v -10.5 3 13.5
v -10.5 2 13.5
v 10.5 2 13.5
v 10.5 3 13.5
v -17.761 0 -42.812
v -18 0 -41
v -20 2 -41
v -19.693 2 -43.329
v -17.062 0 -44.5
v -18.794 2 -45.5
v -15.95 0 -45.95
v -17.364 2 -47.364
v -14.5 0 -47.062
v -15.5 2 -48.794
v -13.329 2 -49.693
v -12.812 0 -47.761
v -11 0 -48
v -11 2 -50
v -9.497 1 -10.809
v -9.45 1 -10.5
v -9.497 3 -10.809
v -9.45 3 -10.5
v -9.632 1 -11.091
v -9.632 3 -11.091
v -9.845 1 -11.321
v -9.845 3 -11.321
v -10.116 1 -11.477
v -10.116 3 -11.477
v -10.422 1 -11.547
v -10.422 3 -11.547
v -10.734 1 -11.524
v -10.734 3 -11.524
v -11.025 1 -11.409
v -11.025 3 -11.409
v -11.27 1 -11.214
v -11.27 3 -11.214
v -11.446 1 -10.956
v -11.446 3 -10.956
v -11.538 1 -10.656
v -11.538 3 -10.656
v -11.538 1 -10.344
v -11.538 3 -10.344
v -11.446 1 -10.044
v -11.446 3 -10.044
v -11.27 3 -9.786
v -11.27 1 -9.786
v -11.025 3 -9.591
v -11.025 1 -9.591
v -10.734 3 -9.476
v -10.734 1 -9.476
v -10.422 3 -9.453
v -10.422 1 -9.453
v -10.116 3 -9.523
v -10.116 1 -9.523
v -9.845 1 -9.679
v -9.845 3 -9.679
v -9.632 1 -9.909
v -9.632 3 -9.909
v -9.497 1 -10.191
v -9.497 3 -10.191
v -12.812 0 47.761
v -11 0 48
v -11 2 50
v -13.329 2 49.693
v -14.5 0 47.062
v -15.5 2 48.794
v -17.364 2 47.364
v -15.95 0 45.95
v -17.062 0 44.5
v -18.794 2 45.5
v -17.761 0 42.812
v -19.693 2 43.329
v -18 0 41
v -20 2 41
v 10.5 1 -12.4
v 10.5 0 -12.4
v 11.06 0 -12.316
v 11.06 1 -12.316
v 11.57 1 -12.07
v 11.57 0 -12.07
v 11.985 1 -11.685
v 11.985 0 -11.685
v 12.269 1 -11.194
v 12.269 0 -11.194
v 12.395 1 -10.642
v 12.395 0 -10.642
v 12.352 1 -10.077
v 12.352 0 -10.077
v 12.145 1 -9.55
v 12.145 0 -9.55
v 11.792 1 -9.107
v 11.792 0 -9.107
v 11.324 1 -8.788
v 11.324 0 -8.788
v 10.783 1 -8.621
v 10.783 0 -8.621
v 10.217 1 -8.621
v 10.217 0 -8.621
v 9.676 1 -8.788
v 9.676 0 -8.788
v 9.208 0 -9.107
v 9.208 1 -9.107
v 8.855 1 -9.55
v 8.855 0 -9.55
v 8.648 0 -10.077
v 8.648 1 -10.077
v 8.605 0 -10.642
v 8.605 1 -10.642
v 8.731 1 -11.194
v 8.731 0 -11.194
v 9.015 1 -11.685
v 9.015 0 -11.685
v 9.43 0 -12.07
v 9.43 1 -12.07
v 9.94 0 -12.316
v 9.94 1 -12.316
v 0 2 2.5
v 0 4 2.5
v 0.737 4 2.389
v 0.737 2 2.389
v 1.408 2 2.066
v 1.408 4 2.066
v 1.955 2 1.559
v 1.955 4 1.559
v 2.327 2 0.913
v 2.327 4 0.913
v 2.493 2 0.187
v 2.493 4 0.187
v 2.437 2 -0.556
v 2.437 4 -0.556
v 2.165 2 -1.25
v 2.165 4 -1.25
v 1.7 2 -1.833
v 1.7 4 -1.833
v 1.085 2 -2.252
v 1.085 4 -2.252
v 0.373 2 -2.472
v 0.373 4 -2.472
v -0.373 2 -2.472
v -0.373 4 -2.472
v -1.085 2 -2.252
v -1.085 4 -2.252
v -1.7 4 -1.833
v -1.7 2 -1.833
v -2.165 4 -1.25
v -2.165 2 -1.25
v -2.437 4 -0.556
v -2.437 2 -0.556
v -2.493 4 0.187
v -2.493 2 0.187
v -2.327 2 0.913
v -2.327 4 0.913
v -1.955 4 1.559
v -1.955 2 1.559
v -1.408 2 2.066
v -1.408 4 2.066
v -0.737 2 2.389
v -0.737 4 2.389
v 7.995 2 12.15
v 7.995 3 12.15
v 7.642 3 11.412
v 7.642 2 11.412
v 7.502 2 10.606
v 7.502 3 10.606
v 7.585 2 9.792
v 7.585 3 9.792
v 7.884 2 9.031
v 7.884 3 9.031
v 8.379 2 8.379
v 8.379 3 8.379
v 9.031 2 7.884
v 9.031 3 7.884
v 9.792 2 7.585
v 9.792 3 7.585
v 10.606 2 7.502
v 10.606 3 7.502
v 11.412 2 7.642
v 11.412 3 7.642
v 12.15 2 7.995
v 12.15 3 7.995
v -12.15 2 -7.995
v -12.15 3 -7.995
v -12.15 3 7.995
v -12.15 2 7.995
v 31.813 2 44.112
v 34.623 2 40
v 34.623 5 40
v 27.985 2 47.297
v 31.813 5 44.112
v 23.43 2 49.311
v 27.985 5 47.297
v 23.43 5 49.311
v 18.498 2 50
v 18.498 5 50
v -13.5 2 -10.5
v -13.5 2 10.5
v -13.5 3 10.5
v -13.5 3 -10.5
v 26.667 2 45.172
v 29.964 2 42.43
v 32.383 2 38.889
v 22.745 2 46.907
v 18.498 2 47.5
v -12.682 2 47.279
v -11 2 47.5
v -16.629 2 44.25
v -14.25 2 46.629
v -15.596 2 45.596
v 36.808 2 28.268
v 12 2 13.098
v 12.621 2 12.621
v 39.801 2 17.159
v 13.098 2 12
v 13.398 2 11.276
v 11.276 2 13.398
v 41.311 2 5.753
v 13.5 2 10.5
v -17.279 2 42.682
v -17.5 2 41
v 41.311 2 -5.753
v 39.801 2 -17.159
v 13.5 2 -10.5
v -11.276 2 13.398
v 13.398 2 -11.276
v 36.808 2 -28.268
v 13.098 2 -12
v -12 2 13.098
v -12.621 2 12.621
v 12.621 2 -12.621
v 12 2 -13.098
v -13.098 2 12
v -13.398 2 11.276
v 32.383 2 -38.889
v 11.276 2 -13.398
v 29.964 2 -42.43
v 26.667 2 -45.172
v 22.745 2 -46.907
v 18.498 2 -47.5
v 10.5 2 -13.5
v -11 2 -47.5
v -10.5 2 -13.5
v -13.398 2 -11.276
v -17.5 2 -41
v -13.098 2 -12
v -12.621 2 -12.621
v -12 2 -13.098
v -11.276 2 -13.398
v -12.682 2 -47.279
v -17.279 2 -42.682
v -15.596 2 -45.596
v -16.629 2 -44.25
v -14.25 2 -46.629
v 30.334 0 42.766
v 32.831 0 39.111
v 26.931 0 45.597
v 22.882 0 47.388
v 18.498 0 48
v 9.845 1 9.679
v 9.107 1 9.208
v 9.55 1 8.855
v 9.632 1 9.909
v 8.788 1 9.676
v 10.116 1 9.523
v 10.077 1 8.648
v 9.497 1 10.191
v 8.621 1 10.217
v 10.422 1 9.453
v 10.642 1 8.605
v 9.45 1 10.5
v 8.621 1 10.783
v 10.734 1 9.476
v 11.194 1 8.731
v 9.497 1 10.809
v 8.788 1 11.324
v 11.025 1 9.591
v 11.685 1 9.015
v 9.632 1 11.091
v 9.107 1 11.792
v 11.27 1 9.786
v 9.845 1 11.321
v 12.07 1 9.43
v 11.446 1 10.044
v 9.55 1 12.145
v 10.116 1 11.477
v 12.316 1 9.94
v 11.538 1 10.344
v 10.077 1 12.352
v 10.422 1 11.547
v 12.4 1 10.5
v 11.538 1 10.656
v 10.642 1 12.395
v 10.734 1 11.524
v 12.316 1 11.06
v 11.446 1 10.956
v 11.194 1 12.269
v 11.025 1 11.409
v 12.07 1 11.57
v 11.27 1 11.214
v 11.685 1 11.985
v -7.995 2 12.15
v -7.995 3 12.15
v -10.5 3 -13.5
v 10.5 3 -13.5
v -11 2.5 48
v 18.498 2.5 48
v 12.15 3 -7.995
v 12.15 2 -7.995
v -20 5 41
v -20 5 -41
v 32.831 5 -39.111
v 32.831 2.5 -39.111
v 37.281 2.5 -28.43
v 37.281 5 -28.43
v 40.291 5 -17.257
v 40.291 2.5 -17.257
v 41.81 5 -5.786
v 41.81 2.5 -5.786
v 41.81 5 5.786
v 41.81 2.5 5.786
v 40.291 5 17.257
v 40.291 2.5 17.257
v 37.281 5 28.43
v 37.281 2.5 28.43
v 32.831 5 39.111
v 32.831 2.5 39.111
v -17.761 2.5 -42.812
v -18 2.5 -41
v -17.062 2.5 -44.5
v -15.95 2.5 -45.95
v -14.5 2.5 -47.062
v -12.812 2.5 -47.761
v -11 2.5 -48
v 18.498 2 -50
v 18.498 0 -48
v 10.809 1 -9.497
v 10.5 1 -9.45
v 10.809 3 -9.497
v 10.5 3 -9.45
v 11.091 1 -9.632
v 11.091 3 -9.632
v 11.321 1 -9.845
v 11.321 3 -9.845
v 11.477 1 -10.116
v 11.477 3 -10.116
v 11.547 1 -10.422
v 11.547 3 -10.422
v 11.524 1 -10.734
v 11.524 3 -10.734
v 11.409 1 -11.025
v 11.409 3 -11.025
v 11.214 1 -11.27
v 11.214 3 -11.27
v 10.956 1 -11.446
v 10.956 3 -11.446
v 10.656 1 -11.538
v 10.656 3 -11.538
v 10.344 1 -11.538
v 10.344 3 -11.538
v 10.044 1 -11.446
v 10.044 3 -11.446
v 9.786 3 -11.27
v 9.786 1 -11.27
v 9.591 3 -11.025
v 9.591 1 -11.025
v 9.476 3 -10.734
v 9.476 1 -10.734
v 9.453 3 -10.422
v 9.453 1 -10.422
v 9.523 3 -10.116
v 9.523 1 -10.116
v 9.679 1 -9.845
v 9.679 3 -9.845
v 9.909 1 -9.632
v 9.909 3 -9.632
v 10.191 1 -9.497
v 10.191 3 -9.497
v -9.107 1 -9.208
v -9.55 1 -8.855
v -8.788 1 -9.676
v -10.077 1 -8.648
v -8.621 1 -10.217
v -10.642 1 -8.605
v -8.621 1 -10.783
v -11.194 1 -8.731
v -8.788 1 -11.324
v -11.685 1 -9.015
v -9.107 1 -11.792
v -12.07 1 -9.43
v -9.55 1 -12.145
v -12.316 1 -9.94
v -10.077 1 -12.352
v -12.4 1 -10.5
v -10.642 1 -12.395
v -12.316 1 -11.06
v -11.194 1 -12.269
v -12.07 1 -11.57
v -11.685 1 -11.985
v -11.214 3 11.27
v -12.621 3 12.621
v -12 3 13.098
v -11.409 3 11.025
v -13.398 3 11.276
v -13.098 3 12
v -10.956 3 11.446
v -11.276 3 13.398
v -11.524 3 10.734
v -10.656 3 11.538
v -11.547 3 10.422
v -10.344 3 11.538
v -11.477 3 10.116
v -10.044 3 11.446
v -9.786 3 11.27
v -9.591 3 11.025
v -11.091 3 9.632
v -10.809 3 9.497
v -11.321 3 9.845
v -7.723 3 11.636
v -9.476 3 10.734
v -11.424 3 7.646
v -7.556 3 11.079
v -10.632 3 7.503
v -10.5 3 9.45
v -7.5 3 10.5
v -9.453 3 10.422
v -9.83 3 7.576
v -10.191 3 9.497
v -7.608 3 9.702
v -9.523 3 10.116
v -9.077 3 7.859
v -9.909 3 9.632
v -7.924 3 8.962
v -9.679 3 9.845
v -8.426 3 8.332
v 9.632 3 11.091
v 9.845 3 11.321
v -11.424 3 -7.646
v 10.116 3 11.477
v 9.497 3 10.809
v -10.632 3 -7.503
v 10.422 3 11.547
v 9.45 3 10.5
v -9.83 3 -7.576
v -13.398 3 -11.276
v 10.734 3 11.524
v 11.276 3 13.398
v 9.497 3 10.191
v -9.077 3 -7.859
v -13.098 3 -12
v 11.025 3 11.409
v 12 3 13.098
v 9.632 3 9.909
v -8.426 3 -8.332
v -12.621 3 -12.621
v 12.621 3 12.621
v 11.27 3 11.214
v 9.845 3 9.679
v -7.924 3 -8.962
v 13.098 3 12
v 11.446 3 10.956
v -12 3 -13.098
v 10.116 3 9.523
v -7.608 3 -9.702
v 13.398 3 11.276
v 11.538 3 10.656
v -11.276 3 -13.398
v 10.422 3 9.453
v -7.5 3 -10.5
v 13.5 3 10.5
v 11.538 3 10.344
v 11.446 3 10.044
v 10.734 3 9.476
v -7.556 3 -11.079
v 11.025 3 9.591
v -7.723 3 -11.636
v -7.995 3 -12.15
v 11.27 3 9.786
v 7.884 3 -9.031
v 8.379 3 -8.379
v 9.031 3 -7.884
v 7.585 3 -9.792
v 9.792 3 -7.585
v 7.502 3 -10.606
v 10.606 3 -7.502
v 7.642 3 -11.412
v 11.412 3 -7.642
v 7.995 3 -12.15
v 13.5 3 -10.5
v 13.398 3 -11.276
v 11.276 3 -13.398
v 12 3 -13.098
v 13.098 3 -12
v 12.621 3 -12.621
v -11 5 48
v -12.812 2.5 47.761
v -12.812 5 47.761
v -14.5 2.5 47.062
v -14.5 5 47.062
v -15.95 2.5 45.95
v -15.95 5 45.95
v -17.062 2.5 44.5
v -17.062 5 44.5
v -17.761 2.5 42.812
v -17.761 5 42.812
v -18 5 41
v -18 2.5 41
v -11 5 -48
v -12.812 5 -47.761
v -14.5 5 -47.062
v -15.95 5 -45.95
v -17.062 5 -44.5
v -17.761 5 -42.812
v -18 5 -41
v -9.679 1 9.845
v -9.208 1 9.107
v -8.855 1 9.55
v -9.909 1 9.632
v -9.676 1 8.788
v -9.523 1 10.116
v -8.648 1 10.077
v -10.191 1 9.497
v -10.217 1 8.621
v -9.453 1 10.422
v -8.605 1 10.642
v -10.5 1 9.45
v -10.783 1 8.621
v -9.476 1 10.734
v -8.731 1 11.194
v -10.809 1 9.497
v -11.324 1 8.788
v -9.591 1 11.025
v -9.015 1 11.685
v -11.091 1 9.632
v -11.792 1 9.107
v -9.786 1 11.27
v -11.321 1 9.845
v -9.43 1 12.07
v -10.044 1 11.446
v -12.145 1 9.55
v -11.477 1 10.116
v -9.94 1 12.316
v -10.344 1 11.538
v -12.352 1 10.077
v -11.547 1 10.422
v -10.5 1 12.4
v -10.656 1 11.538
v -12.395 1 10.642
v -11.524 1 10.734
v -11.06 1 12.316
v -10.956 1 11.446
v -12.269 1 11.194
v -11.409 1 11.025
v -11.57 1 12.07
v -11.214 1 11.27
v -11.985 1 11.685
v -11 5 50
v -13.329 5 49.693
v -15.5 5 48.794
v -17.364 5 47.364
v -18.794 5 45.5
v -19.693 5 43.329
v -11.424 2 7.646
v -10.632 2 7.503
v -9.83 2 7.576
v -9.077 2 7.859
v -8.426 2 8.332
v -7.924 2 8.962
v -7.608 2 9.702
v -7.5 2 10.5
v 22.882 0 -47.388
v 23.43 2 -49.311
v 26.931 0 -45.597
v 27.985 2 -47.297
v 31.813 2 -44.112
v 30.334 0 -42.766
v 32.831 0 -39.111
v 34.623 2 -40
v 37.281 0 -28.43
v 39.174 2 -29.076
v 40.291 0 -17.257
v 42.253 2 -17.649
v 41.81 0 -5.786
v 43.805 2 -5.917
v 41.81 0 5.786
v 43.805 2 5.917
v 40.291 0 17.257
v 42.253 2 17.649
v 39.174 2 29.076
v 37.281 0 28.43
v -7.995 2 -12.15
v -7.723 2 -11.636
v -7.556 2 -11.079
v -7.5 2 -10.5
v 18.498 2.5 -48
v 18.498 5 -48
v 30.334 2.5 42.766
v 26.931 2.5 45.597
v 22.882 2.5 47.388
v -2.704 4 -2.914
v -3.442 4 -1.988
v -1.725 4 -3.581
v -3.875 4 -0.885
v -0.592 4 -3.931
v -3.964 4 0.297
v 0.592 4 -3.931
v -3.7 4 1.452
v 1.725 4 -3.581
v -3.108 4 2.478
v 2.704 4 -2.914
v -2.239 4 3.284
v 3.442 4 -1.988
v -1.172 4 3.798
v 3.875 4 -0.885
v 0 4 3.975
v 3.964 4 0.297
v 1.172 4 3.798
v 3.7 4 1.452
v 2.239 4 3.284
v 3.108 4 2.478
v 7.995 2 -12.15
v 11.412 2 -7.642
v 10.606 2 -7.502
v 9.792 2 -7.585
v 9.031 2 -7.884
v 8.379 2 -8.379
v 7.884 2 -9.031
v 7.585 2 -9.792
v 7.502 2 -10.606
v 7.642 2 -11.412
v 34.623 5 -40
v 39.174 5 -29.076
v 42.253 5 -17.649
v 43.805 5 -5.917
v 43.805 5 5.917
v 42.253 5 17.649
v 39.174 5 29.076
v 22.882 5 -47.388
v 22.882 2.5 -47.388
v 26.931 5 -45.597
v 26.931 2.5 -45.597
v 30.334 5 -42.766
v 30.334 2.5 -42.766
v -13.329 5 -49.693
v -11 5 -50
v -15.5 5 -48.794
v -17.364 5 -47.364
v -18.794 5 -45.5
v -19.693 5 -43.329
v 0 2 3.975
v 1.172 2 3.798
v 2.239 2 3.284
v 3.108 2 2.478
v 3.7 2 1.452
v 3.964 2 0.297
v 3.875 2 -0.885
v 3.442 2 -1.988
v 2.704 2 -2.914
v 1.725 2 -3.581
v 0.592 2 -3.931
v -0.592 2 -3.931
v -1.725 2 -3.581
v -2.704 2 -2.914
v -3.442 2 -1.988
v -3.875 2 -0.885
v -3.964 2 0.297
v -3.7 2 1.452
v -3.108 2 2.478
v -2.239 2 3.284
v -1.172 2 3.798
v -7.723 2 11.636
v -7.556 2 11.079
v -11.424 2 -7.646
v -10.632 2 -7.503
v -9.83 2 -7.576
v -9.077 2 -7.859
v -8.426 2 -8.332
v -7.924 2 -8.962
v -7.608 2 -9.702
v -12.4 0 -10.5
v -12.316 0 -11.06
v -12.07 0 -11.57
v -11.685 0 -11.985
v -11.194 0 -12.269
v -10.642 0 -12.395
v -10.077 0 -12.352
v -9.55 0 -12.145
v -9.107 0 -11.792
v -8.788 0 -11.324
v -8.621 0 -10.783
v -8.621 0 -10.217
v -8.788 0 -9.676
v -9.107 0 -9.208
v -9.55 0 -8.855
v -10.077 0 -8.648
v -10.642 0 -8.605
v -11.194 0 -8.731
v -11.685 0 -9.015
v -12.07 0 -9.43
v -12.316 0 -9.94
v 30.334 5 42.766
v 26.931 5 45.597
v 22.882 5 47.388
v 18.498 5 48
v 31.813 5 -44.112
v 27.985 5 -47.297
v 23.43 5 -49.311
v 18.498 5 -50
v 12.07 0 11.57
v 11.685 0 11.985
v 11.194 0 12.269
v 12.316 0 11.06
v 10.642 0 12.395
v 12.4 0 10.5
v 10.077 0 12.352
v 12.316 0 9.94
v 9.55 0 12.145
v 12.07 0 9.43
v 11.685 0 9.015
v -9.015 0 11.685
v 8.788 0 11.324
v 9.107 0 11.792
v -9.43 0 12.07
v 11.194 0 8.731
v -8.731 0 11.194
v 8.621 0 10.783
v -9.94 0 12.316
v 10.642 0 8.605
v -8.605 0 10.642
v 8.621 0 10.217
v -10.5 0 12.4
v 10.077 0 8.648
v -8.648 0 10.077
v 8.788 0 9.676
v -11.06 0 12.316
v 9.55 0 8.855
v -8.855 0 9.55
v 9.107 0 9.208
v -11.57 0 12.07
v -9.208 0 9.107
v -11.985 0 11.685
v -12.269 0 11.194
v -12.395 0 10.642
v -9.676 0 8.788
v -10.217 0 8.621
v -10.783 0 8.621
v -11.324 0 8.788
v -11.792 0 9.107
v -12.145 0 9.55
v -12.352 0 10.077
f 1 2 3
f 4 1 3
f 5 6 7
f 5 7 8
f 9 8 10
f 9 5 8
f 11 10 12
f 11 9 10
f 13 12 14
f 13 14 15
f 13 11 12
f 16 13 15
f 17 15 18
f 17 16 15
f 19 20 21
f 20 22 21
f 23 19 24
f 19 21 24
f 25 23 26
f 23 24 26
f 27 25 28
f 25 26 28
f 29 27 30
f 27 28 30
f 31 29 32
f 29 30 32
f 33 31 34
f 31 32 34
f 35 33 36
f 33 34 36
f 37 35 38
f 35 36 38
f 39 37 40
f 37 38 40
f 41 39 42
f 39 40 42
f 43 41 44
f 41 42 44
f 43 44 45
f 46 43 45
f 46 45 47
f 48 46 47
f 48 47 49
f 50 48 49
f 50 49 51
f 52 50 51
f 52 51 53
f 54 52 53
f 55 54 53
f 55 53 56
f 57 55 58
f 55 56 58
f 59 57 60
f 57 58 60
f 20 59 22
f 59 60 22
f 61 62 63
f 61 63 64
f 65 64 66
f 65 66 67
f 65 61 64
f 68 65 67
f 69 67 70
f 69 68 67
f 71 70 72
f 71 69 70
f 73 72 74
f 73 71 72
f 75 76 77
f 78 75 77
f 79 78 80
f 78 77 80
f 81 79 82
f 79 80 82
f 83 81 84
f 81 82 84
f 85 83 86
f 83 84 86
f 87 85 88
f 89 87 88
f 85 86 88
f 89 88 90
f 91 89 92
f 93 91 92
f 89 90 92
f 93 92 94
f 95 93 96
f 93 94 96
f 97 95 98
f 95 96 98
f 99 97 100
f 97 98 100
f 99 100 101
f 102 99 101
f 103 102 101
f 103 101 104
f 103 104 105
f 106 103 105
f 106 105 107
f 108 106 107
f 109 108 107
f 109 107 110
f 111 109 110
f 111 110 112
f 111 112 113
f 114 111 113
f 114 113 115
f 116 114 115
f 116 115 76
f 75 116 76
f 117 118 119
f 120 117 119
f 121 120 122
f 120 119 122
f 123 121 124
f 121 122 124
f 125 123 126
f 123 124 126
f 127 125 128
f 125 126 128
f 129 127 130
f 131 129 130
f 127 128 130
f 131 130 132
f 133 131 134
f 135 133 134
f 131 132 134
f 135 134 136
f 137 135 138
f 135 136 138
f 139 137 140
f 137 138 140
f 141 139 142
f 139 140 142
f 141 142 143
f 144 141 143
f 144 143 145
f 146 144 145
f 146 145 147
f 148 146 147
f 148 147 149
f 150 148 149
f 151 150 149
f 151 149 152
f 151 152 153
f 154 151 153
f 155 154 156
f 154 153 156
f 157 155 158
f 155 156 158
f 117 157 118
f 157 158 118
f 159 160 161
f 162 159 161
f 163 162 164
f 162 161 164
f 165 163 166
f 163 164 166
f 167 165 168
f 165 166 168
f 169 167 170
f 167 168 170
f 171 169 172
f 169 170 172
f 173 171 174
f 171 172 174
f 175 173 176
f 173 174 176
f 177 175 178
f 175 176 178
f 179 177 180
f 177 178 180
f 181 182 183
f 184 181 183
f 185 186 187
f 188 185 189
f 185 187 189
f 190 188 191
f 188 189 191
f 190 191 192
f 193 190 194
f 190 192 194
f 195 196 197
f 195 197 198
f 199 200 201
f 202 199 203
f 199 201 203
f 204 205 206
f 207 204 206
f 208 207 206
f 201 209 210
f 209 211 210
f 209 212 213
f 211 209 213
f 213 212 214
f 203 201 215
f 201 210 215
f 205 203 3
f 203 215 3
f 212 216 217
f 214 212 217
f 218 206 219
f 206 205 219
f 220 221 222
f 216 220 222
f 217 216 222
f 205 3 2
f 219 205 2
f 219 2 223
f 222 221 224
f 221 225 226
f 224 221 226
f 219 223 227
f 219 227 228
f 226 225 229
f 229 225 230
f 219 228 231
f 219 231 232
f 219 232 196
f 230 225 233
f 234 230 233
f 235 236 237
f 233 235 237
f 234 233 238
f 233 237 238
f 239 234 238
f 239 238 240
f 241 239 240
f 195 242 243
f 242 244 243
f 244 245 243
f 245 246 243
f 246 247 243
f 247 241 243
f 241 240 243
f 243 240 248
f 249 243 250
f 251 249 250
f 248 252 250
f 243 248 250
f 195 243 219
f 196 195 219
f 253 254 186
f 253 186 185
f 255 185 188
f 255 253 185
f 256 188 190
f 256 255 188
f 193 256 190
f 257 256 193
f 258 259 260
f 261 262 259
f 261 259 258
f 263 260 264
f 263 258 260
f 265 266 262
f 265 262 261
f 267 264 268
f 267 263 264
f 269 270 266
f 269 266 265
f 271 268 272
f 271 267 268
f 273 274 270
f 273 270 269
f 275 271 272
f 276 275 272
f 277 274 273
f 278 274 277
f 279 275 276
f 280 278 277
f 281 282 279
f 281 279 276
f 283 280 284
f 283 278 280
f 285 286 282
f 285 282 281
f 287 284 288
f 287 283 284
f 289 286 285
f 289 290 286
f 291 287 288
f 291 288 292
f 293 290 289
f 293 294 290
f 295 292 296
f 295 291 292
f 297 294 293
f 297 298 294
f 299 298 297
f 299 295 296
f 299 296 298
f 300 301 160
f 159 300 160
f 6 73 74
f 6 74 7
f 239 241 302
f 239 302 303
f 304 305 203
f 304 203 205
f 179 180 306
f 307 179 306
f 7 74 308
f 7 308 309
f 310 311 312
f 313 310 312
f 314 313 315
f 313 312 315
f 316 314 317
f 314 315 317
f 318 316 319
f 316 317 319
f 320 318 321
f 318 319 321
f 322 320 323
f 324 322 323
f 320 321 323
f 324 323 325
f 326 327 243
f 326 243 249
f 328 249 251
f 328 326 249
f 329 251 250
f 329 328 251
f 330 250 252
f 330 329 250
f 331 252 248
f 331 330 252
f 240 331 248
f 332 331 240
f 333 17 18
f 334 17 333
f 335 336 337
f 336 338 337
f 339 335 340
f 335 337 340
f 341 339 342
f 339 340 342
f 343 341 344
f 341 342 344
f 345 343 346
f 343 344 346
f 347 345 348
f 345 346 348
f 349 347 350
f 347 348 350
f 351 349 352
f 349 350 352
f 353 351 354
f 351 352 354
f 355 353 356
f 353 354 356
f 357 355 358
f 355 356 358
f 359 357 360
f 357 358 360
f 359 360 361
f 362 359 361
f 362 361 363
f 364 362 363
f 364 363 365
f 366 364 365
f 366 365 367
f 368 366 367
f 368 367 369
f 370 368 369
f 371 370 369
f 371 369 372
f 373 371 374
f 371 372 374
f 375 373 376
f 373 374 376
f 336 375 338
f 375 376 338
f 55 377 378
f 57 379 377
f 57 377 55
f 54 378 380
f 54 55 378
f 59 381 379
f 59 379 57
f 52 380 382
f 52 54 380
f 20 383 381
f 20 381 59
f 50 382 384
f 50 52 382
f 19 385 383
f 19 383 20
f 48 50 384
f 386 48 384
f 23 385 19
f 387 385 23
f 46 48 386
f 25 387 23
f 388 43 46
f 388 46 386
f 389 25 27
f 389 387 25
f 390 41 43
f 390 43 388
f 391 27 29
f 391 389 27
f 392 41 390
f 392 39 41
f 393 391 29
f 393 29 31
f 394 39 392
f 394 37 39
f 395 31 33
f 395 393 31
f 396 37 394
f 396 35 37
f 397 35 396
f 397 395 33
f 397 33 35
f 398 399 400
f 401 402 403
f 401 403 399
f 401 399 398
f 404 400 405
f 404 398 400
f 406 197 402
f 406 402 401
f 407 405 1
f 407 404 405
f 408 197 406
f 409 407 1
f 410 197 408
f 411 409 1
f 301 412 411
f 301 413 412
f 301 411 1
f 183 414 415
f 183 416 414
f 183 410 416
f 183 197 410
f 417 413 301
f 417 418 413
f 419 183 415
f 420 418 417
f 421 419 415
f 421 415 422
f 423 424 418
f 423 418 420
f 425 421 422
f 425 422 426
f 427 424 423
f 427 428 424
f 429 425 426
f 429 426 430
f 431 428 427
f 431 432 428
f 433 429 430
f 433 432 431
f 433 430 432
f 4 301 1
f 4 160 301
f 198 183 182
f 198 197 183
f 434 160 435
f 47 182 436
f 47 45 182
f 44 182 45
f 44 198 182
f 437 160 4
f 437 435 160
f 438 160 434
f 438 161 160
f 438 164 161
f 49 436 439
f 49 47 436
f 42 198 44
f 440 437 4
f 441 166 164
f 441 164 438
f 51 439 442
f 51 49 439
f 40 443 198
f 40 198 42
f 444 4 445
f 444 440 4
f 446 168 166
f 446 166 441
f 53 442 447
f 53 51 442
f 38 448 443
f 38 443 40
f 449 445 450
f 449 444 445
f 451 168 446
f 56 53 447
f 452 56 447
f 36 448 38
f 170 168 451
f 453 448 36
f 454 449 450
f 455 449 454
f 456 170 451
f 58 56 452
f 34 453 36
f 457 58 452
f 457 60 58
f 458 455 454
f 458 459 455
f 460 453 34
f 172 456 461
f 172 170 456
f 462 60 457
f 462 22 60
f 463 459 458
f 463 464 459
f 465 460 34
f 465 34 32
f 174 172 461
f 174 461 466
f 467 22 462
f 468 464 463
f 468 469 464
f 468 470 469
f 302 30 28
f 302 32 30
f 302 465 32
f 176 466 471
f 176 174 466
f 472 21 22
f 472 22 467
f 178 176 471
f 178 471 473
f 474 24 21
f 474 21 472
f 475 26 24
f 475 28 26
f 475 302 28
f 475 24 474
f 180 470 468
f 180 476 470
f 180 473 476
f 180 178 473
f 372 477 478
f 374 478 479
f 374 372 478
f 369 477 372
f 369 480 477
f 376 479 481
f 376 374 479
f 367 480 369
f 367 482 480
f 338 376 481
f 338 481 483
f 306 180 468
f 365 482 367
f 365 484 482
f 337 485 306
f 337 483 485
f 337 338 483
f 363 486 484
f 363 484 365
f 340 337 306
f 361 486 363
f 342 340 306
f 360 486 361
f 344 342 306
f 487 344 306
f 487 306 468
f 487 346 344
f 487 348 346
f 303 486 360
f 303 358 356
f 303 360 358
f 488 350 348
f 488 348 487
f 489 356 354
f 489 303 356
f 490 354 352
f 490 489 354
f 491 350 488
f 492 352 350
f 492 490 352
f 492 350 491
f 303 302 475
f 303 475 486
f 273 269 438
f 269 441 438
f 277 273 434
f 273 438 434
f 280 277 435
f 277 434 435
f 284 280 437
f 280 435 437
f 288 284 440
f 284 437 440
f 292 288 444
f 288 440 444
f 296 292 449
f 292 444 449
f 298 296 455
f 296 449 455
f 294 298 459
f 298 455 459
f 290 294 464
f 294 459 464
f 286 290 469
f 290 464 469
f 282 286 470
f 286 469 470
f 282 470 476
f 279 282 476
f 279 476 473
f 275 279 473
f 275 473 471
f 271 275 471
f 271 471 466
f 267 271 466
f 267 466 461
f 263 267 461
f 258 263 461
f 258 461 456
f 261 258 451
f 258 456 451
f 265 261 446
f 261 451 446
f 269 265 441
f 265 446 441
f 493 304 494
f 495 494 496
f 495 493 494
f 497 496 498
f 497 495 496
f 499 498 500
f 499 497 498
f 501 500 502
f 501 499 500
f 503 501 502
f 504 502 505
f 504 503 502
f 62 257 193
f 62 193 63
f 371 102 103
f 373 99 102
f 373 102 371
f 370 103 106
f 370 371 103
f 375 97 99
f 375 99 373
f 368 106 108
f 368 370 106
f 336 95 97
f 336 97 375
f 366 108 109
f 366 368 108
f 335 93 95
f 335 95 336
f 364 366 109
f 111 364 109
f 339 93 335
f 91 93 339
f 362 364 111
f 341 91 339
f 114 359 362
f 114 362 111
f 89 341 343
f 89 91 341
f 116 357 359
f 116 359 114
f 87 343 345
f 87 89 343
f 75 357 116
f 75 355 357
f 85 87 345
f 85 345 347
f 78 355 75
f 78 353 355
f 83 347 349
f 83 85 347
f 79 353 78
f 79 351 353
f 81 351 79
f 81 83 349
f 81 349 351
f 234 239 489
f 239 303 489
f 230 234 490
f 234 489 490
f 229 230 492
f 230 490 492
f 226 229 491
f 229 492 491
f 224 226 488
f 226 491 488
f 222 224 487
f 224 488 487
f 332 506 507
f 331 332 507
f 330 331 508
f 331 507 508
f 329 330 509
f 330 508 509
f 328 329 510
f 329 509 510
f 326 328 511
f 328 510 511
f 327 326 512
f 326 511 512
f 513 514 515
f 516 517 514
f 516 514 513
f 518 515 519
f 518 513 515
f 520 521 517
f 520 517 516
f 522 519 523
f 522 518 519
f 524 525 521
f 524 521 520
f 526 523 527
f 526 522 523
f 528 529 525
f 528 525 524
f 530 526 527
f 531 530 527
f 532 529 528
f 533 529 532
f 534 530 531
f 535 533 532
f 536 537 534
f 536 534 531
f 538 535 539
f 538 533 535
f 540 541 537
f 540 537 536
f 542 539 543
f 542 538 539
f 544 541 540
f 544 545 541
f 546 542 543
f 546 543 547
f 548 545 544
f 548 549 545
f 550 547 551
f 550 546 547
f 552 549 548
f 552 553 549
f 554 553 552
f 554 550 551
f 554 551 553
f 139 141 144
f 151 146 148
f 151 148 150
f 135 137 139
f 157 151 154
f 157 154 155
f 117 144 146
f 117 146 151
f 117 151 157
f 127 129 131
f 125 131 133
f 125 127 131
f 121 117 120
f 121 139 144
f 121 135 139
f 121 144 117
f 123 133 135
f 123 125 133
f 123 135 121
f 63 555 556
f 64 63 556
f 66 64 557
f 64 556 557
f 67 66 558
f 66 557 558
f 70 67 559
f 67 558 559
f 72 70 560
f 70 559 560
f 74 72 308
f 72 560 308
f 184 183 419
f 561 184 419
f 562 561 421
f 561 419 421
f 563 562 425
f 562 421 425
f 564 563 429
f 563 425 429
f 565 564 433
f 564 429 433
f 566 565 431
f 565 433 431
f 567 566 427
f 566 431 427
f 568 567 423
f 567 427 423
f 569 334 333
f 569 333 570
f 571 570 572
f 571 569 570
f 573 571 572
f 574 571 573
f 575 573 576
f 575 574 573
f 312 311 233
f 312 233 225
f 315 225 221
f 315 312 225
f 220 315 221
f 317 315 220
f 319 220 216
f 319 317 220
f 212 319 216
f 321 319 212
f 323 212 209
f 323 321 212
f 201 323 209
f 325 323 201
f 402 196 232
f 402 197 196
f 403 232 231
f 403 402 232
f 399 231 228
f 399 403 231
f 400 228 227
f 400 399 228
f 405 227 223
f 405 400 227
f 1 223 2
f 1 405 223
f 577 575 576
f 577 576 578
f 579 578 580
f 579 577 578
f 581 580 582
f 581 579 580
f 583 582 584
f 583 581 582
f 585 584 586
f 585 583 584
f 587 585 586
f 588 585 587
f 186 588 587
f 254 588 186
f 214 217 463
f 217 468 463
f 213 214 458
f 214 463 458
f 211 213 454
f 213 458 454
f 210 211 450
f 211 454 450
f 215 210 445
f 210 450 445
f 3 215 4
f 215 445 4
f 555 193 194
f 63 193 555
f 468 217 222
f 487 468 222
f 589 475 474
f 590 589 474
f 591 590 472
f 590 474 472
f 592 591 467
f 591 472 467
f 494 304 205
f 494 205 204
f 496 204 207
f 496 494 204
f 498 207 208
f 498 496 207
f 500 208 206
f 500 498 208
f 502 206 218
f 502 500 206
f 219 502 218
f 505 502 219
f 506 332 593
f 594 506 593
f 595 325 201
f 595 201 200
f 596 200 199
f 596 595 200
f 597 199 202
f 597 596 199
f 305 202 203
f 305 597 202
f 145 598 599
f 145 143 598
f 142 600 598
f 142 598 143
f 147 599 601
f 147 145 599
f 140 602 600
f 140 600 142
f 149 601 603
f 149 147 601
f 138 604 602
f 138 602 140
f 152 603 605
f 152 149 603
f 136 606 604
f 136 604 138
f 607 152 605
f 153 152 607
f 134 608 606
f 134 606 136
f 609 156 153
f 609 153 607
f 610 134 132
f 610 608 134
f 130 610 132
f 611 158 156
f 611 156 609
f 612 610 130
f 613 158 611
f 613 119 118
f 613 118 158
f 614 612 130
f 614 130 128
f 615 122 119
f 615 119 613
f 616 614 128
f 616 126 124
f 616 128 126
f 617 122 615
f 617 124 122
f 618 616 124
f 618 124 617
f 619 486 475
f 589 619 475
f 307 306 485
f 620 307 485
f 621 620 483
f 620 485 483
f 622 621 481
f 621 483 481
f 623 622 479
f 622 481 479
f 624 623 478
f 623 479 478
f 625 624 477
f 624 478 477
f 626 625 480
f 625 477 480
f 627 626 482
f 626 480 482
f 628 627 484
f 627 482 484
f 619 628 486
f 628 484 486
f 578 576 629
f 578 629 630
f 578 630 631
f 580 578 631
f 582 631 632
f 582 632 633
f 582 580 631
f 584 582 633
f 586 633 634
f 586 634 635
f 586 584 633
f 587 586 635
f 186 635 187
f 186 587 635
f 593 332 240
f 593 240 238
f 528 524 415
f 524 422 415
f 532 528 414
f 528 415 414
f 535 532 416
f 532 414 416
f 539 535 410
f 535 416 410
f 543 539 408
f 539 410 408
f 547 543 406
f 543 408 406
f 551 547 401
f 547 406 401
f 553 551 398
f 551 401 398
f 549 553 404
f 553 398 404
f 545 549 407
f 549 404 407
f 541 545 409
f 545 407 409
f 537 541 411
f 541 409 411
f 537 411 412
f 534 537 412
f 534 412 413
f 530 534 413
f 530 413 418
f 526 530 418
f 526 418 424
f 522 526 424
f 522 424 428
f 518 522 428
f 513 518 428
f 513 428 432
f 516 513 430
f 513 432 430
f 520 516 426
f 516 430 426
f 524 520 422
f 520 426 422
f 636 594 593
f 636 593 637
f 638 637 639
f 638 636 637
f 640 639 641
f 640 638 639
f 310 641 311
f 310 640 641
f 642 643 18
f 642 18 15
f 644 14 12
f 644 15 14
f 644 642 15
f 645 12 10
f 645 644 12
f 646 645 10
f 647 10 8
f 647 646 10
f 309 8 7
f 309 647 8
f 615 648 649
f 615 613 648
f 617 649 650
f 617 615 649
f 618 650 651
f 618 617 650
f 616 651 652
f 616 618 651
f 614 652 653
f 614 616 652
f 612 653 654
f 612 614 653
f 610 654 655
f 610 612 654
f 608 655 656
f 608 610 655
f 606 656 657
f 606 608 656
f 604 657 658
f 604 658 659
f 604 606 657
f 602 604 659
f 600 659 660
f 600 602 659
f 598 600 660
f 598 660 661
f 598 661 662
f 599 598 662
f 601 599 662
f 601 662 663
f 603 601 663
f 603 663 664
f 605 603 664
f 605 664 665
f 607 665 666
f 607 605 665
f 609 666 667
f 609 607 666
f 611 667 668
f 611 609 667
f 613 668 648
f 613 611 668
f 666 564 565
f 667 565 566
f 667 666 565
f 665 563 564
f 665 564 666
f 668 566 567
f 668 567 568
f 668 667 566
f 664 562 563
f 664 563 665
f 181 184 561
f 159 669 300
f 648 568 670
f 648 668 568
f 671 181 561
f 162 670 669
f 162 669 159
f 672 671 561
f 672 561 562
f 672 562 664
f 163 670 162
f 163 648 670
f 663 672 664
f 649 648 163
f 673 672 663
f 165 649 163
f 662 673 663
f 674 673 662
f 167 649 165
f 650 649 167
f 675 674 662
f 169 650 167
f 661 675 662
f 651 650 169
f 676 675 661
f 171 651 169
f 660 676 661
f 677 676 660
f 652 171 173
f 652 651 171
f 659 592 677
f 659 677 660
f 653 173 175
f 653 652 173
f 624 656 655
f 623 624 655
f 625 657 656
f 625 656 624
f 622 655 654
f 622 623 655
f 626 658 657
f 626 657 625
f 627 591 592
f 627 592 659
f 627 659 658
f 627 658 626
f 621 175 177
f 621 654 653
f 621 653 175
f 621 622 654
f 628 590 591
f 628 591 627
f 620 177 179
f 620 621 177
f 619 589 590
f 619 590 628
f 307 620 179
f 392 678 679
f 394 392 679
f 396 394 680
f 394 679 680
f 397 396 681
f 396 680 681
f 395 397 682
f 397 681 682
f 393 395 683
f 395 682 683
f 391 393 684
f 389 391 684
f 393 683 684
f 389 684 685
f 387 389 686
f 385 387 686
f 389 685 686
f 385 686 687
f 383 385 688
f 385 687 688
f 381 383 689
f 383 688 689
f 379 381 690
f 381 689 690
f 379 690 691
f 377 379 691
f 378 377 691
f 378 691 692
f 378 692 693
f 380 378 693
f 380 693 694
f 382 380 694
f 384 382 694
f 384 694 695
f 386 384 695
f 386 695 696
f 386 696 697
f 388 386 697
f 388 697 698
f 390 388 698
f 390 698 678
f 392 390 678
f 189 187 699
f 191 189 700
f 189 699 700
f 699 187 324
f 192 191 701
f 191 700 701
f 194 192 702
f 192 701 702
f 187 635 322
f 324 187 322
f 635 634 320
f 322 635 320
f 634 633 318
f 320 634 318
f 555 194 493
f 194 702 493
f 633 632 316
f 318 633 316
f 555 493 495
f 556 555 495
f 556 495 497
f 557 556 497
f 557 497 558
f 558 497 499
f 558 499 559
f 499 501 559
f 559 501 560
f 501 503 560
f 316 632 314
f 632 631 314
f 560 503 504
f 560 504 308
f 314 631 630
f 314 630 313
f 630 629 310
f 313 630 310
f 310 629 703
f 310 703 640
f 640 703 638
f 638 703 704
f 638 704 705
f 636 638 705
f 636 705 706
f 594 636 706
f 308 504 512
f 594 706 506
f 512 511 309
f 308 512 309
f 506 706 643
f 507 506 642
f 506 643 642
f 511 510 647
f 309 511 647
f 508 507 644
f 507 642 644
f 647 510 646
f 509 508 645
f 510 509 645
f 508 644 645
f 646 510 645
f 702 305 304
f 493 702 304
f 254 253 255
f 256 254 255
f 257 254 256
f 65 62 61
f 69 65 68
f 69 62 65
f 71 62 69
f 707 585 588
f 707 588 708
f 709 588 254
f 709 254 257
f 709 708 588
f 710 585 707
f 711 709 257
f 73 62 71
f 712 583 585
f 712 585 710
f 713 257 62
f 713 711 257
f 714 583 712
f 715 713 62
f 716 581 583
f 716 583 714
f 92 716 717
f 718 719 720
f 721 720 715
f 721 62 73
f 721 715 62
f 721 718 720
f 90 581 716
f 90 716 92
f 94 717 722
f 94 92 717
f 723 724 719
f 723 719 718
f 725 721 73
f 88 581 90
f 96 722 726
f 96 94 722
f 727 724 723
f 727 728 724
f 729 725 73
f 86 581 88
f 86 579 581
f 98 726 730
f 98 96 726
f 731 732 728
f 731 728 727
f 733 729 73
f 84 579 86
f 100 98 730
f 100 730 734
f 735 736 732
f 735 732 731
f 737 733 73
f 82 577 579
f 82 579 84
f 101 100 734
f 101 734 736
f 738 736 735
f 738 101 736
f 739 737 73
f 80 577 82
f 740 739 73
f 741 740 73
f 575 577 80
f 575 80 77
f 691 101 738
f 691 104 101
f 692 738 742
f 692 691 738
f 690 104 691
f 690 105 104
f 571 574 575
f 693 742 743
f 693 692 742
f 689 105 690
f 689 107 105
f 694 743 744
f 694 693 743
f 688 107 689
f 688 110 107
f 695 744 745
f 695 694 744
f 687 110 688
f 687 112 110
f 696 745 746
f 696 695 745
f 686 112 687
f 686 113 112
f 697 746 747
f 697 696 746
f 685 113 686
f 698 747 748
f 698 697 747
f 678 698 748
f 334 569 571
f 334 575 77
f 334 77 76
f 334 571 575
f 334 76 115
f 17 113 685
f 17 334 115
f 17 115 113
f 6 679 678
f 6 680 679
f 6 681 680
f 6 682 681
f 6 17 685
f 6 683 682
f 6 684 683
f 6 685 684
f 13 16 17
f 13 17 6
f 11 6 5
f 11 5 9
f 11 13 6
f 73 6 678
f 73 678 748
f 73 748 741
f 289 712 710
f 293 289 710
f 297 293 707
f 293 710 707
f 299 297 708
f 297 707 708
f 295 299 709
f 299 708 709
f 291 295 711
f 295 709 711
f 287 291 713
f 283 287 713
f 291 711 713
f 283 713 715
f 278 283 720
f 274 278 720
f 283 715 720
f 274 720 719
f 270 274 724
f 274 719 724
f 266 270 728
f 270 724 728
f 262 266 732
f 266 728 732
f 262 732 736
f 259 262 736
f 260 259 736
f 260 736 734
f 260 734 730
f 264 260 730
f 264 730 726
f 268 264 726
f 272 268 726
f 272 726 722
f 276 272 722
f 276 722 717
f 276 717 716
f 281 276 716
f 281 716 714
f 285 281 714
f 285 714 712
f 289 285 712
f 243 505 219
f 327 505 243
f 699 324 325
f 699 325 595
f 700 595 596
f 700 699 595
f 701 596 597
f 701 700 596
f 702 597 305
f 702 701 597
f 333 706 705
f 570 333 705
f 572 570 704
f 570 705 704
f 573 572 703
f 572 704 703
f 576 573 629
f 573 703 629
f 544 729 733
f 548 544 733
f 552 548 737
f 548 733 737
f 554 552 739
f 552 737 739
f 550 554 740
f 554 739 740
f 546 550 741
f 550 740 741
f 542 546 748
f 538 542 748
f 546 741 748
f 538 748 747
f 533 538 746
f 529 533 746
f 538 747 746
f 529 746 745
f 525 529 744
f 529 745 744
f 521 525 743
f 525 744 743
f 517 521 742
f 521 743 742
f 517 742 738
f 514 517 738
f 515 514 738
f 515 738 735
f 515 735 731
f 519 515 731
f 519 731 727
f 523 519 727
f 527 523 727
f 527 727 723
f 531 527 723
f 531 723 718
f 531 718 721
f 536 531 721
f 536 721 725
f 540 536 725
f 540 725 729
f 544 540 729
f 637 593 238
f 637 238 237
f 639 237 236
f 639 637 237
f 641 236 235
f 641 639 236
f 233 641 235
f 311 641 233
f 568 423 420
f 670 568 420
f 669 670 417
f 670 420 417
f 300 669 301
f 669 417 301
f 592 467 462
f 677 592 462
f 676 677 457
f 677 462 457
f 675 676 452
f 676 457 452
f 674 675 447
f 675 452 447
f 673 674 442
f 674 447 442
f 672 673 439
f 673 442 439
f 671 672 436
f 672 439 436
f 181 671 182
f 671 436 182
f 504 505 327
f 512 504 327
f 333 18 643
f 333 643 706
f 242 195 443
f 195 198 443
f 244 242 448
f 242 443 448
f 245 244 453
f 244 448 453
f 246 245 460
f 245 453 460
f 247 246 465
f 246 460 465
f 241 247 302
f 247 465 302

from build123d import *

# Parameters (mm, degrees)
EXTRUDE_1_DEPTH              = 5
FILLET_1_R                   = 9
FILLET_2_R                   = 18
SHELL_1_T                    = -2
CHAMFER_1_SIZE               = 0.5
CHAMFER_2_SIZE               = 2
SKETCH_2_W                   = 27
SKETCH_2_H                   = 27
EXTRUDE_2_DEPTH              = 1
SKETCH_3_R                   = 3.975
EXTRUDE_3_DEPTH              = 1
FILLET_3_R                   = 3
HOLE_WIZARD_M2_1_D           = 2.1
HOLE_WIZARD_M2_1_CBORE_D     = 3.8
HOLE_WIZARD_M2_1_CBORE_DEPTH = 1
PATTERN_CIRCULAR_1_COUNT     = 4
SKETCH_6_R                   = 3.975
CUT_EXTRUDE_1_DEPTH          = 1
SKETCH_7_R                   = 2.5
CUT_EXTRUDE_2_DEPTH          = 2


with BuildPart() as part:
    # ｽｹｯﾁ1 → ﾎﾞｽ - 押し出し1 (new body)
    with BuildSketch(Plane(origin=(0, 0, 0), x_dir=(1, 0, 0), z_dir=(0, 1, 0))):
        with BuildLine():
            Line((-20, 50), (28.833147735, 50))
            ThreePointArc((28.833147735, 50), (44, 0), (28.833147735, -50))
            Line((28.833147735, -50), (-20, -50))
            Line((-20, -50), (-20, 50))
        make_face()
    extrude(amount=EXTRUDE_1_DEPTH)

    # ﾌｨﾚｯﾄ1
    fillet_1_edges = [part.edges().sort_by_distance(p)[0] for p in [
        (-20, 2.5, -50),
        (-20, 2.5, 50),
    ]]
    fillet(fillet_1_edges, radius=FILLET_1_R)

    # ﾌｨﾚｯﾄ2
    fillet_2_edges = [part.edges().sort_by_distance(p)[0] for p in [
        (28.833147735, 2.5, -50),
        (28.833147735, 2.5, 50),
    ]]
    fillet(fillet_2_edges, radius=FILLET_2_R)

    # ｼｪﾙ1
    shell_1_openings = [part.faces().sort_by_distance(p)[0] for p in [
        (9.782139289, 5, 0),
    ]]
    offset(amount=SHELL_1_T, openings=shell_1_openings, kind=Kind.INTERSECTION)

    # 面取り1
    chamfer_1_edges = [part.edges().sort_by_distance(p)[0] for p in [
        (-18, 2, 0),
        (3.749030993, 2, 48),
        (42, 2, 0),
        (3.749030993, 2, -48),
        (26.930802414, 2, -45.59738537),
        (26.930802414, 2, 45.59738537),
        (-15.949747468, 2, 45.949747468),
        (-15.949747468, 2, -45.949747468),
    ]]
    chamfer(chamfer_1_edges, length=CHAMFER_1_SIZE)

    # 面取り2
    chamfer_2_edges = [part.edges().sort_by_distance(p)[0] for p in [
        (-20, 0, 0),
        (3.749030993, 0, 50),
        (-17.363961031, 0, 47.363961031),
        (-17.363961031, 0, -47.363961031),
        (3.749030993, 0, -50),
        (44, 0, 0),
        (27.984894967, 0, 47.297058541),
        (27.984894967, 0, -47.297058541),
    ]]
    chamfer(chamfer_2_edges, length=CHAMFER_2_SIZE)

    # ｽｹｯﾁ2 → ﾎﾞｽ - 押し出し2 (add)
    with BuildSketch(Plane(origin=(0, 2, 0), x_dir=(1, 0, 0), z_dir=(0, 1, 0))):
        Rectangle(SKETCH_2_W, SKETCH_2_H)
    extrude(amount=EXTRUDE_2_DEPTH)

    # ｽｹｯﾁ3 → ﾎﾞｽ - 押し出し3 (add)
    with BuildSketch(Plane(origin=(0, 3, 0), x_dir=(1, 0, 0), z_dir=(0, 1, 0))):
        with Locations(Location((0, 0, 0), (0, 0, 270))):
            Circle(SKETCH_3_R)
    extrude(amount=EXTRUDE_3_DEPTH)

    # ﾌｨﾚｯﾄ3
    fillet_3_edges = [part.edges().sort_by_distance(p)[0] for p in [
        (13.5, 2.5, 13.5),
        (13.5, 2.5, -13.5),
        (-13.5, 2.5, -13.5),
        (-13.5, 2.5, 13.5),
    ]]
    fillet(fillet_3_edges, radius=FILLET_3_R)

    # M2 なべ頭ねじ用座ぐり穴1 (through all)
    with Locations(Plane(origin=(0, 0, 0), x_dir=(-1, 0, 0), z_dir=(0, -1, 0))):
        with Locations((10.5, 10.5)):
            hole_wizard_m2_1 = CounterBoreHole(HOLE_WIZARD_M2_1_D / 2, HOLE_WIZARD_M2_1_CBORE_D / 2, HOLE_WIZARD_M2_1_CBORE_DEPTH)

    # 円形ﾊﾟﾀｰﾝ1: M2 なべ頭ねじ用座ぐり穴1 ×4 about axis
    pattern_circular_1_axis = Axis((0, 0, 0), (0, 1, 0))
    for i in range(1, PATTERN_CIRCULAR_1_COUNT):
        add(hole_wizard_m2_1.rotate(pattern_circular_1_axis, i * 360 / PATTERN_CIRCULAR_1_COUNT), mode=Mode.SUBTRACT)

    # ｽｹｯﾁ6 → ｶｯﾄ - 押し出し1 (cut)
    with BuildSketch(Plane(origin=(0, 3, 0), x_dir=(1, 0, 0), z_dir=(0, 1, 0))):
        with BuildLine():
            Line((-7.994506037, -12.15), (7.994506037, -12.15))
            ThreePointArc((7.994506037, -12.15), (8.378679656, -8.378679656), (12.15, -7.994506037))
            Line((12.15, -7.994506037), (12.15, 7.994506037))
            ThreePointArc((12.15, 7.994506037), (8.378679656, 8.378679656), (7.994506037, 12.15))
            Line((7.994506037, 12.15), (-7.994506037, 12.15))
            ThreePointArc((-7.994506037, 12.15), (-7.62628447, 11.36125435), (-7.5, 10.5))
            ThreePointArc((-7.5, 10.5), (-9.076975053, 7.858977471), (-12.15, 7.994506037))
            Line((-12.15, 7.994506037), (-12.15, -7.994506037))
            ThreePointArc((-12.15, -7.994506037), (-9.076975053, -7.858977471), (-7.5, -10.5))
            ThreePointArc((-7.5, -10.5), (-7.62628447, -11.36125435), (-7.994506037, -12.15))
        make_face()
        with Locations(Location((0, 0, 0), (0, 0, 270))):
            Circle(SKETCH_6_R, mode=Mode.SUBTRACT)
    extrude(amount=-CUT_EXTRUDE_1_DEPTH, mode=Mode.SUBTRACT)

    # ｽｹｯﾁ7 → ｶｯﾄ - 押し出し2 (cut)
    with BuildSketch(Plane(origin=(0, 4, 0), x_dir=(1, 0, 0), z_dir=(0, 1, 0))):
        with Locations(Location((0, 0, 0), (0, 0, 270))):
            Circle(SKETCH_7_R)
    extrude(amount=-CUT_EXTRUDE_2_DEPTH, mode=Mode.SUBTRACT)


solid = part.part
